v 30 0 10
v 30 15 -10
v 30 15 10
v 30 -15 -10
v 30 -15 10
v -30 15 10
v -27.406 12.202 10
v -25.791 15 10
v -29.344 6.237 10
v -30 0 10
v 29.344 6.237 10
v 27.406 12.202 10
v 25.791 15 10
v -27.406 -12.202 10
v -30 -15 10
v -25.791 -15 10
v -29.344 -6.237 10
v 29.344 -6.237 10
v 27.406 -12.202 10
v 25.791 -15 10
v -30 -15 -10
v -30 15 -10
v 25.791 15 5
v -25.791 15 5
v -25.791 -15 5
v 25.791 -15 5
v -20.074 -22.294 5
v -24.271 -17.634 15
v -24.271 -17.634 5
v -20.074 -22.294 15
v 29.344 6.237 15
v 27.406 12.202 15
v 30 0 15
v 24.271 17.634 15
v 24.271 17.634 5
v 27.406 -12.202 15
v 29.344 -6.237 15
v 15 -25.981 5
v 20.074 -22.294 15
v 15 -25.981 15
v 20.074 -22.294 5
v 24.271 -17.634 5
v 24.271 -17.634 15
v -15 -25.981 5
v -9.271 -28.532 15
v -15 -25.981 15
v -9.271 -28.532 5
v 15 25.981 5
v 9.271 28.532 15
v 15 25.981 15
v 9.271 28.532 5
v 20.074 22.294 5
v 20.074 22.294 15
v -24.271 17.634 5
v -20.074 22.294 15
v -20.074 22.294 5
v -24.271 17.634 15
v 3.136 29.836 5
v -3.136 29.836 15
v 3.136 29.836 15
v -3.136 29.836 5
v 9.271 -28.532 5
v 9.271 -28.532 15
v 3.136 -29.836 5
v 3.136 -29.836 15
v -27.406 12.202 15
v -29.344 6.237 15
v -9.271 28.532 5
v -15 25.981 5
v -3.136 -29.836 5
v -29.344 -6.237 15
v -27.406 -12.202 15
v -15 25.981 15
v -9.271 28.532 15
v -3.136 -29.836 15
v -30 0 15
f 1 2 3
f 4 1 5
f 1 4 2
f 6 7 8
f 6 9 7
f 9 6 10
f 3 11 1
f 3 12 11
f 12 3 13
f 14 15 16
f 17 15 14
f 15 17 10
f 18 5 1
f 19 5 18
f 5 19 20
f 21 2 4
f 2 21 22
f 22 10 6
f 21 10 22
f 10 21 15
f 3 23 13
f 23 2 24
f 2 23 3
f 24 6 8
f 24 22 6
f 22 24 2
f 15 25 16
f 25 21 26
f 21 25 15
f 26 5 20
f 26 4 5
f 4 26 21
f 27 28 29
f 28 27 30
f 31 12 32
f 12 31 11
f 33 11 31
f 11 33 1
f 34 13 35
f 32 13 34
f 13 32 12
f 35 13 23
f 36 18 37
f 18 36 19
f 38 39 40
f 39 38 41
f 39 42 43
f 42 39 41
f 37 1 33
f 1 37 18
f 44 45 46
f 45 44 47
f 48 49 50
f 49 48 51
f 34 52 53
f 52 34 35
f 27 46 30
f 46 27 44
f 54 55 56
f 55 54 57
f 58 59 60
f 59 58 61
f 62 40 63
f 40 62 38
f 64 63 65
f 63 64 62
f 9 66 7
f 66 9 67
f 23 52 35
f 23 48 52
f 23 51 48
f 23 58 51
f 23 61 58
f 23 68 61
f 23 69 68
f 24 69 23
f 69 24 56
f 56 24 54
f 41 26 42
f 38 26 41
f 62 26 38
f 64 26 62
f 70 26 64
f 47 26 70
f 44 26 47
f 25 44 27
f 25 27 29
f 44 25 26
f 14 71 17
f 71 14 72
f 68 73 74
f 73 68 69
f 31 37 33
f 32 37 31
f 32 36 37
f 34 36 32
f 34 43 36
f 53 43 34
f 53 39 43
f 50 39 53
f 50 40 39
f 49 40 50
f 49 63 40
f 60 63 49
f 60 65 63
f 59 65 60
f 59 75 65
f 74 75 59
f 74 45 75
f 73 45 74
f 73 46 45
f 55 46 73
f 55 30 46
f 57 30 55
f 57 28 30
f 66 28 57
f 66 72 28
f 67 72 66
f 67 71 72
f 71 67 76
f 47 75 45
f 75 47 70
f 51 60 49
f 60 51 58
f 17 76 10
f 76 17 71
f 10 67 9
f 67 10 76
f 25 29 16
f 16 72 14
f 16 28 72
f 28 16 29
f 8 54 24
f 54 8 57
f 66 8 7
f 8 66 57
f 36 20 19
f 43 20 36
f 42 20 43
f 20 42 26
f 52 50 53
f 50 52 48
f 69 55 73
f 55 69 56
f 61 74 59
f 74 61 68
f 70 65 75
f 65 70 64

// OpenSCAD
// 灯箱主体
module lamp_box() {
    color("yellow")
    difference() {
        // 主体
        union() {
            cube([60, 30, 20], center = true);
            translate([0, 0, 10])
            cylinder(h = 10, r1 = 30, r2 = 30, center = true);
        }
        // 底部支架
        translate([0, 0, -15])
        cube([60, 30, 5], center = true);
    }
}

// 添加文字
module add_text() {
    translate([-20, 0, 15])
    text("摩的", size = 10, valign = "center", halign = "center");
    
    translate([-20, 0, -5])
    text("TAXI", size = 10, valign = "center", halign = "center");
}

// 组合模型
lamp_box();
add_text();
